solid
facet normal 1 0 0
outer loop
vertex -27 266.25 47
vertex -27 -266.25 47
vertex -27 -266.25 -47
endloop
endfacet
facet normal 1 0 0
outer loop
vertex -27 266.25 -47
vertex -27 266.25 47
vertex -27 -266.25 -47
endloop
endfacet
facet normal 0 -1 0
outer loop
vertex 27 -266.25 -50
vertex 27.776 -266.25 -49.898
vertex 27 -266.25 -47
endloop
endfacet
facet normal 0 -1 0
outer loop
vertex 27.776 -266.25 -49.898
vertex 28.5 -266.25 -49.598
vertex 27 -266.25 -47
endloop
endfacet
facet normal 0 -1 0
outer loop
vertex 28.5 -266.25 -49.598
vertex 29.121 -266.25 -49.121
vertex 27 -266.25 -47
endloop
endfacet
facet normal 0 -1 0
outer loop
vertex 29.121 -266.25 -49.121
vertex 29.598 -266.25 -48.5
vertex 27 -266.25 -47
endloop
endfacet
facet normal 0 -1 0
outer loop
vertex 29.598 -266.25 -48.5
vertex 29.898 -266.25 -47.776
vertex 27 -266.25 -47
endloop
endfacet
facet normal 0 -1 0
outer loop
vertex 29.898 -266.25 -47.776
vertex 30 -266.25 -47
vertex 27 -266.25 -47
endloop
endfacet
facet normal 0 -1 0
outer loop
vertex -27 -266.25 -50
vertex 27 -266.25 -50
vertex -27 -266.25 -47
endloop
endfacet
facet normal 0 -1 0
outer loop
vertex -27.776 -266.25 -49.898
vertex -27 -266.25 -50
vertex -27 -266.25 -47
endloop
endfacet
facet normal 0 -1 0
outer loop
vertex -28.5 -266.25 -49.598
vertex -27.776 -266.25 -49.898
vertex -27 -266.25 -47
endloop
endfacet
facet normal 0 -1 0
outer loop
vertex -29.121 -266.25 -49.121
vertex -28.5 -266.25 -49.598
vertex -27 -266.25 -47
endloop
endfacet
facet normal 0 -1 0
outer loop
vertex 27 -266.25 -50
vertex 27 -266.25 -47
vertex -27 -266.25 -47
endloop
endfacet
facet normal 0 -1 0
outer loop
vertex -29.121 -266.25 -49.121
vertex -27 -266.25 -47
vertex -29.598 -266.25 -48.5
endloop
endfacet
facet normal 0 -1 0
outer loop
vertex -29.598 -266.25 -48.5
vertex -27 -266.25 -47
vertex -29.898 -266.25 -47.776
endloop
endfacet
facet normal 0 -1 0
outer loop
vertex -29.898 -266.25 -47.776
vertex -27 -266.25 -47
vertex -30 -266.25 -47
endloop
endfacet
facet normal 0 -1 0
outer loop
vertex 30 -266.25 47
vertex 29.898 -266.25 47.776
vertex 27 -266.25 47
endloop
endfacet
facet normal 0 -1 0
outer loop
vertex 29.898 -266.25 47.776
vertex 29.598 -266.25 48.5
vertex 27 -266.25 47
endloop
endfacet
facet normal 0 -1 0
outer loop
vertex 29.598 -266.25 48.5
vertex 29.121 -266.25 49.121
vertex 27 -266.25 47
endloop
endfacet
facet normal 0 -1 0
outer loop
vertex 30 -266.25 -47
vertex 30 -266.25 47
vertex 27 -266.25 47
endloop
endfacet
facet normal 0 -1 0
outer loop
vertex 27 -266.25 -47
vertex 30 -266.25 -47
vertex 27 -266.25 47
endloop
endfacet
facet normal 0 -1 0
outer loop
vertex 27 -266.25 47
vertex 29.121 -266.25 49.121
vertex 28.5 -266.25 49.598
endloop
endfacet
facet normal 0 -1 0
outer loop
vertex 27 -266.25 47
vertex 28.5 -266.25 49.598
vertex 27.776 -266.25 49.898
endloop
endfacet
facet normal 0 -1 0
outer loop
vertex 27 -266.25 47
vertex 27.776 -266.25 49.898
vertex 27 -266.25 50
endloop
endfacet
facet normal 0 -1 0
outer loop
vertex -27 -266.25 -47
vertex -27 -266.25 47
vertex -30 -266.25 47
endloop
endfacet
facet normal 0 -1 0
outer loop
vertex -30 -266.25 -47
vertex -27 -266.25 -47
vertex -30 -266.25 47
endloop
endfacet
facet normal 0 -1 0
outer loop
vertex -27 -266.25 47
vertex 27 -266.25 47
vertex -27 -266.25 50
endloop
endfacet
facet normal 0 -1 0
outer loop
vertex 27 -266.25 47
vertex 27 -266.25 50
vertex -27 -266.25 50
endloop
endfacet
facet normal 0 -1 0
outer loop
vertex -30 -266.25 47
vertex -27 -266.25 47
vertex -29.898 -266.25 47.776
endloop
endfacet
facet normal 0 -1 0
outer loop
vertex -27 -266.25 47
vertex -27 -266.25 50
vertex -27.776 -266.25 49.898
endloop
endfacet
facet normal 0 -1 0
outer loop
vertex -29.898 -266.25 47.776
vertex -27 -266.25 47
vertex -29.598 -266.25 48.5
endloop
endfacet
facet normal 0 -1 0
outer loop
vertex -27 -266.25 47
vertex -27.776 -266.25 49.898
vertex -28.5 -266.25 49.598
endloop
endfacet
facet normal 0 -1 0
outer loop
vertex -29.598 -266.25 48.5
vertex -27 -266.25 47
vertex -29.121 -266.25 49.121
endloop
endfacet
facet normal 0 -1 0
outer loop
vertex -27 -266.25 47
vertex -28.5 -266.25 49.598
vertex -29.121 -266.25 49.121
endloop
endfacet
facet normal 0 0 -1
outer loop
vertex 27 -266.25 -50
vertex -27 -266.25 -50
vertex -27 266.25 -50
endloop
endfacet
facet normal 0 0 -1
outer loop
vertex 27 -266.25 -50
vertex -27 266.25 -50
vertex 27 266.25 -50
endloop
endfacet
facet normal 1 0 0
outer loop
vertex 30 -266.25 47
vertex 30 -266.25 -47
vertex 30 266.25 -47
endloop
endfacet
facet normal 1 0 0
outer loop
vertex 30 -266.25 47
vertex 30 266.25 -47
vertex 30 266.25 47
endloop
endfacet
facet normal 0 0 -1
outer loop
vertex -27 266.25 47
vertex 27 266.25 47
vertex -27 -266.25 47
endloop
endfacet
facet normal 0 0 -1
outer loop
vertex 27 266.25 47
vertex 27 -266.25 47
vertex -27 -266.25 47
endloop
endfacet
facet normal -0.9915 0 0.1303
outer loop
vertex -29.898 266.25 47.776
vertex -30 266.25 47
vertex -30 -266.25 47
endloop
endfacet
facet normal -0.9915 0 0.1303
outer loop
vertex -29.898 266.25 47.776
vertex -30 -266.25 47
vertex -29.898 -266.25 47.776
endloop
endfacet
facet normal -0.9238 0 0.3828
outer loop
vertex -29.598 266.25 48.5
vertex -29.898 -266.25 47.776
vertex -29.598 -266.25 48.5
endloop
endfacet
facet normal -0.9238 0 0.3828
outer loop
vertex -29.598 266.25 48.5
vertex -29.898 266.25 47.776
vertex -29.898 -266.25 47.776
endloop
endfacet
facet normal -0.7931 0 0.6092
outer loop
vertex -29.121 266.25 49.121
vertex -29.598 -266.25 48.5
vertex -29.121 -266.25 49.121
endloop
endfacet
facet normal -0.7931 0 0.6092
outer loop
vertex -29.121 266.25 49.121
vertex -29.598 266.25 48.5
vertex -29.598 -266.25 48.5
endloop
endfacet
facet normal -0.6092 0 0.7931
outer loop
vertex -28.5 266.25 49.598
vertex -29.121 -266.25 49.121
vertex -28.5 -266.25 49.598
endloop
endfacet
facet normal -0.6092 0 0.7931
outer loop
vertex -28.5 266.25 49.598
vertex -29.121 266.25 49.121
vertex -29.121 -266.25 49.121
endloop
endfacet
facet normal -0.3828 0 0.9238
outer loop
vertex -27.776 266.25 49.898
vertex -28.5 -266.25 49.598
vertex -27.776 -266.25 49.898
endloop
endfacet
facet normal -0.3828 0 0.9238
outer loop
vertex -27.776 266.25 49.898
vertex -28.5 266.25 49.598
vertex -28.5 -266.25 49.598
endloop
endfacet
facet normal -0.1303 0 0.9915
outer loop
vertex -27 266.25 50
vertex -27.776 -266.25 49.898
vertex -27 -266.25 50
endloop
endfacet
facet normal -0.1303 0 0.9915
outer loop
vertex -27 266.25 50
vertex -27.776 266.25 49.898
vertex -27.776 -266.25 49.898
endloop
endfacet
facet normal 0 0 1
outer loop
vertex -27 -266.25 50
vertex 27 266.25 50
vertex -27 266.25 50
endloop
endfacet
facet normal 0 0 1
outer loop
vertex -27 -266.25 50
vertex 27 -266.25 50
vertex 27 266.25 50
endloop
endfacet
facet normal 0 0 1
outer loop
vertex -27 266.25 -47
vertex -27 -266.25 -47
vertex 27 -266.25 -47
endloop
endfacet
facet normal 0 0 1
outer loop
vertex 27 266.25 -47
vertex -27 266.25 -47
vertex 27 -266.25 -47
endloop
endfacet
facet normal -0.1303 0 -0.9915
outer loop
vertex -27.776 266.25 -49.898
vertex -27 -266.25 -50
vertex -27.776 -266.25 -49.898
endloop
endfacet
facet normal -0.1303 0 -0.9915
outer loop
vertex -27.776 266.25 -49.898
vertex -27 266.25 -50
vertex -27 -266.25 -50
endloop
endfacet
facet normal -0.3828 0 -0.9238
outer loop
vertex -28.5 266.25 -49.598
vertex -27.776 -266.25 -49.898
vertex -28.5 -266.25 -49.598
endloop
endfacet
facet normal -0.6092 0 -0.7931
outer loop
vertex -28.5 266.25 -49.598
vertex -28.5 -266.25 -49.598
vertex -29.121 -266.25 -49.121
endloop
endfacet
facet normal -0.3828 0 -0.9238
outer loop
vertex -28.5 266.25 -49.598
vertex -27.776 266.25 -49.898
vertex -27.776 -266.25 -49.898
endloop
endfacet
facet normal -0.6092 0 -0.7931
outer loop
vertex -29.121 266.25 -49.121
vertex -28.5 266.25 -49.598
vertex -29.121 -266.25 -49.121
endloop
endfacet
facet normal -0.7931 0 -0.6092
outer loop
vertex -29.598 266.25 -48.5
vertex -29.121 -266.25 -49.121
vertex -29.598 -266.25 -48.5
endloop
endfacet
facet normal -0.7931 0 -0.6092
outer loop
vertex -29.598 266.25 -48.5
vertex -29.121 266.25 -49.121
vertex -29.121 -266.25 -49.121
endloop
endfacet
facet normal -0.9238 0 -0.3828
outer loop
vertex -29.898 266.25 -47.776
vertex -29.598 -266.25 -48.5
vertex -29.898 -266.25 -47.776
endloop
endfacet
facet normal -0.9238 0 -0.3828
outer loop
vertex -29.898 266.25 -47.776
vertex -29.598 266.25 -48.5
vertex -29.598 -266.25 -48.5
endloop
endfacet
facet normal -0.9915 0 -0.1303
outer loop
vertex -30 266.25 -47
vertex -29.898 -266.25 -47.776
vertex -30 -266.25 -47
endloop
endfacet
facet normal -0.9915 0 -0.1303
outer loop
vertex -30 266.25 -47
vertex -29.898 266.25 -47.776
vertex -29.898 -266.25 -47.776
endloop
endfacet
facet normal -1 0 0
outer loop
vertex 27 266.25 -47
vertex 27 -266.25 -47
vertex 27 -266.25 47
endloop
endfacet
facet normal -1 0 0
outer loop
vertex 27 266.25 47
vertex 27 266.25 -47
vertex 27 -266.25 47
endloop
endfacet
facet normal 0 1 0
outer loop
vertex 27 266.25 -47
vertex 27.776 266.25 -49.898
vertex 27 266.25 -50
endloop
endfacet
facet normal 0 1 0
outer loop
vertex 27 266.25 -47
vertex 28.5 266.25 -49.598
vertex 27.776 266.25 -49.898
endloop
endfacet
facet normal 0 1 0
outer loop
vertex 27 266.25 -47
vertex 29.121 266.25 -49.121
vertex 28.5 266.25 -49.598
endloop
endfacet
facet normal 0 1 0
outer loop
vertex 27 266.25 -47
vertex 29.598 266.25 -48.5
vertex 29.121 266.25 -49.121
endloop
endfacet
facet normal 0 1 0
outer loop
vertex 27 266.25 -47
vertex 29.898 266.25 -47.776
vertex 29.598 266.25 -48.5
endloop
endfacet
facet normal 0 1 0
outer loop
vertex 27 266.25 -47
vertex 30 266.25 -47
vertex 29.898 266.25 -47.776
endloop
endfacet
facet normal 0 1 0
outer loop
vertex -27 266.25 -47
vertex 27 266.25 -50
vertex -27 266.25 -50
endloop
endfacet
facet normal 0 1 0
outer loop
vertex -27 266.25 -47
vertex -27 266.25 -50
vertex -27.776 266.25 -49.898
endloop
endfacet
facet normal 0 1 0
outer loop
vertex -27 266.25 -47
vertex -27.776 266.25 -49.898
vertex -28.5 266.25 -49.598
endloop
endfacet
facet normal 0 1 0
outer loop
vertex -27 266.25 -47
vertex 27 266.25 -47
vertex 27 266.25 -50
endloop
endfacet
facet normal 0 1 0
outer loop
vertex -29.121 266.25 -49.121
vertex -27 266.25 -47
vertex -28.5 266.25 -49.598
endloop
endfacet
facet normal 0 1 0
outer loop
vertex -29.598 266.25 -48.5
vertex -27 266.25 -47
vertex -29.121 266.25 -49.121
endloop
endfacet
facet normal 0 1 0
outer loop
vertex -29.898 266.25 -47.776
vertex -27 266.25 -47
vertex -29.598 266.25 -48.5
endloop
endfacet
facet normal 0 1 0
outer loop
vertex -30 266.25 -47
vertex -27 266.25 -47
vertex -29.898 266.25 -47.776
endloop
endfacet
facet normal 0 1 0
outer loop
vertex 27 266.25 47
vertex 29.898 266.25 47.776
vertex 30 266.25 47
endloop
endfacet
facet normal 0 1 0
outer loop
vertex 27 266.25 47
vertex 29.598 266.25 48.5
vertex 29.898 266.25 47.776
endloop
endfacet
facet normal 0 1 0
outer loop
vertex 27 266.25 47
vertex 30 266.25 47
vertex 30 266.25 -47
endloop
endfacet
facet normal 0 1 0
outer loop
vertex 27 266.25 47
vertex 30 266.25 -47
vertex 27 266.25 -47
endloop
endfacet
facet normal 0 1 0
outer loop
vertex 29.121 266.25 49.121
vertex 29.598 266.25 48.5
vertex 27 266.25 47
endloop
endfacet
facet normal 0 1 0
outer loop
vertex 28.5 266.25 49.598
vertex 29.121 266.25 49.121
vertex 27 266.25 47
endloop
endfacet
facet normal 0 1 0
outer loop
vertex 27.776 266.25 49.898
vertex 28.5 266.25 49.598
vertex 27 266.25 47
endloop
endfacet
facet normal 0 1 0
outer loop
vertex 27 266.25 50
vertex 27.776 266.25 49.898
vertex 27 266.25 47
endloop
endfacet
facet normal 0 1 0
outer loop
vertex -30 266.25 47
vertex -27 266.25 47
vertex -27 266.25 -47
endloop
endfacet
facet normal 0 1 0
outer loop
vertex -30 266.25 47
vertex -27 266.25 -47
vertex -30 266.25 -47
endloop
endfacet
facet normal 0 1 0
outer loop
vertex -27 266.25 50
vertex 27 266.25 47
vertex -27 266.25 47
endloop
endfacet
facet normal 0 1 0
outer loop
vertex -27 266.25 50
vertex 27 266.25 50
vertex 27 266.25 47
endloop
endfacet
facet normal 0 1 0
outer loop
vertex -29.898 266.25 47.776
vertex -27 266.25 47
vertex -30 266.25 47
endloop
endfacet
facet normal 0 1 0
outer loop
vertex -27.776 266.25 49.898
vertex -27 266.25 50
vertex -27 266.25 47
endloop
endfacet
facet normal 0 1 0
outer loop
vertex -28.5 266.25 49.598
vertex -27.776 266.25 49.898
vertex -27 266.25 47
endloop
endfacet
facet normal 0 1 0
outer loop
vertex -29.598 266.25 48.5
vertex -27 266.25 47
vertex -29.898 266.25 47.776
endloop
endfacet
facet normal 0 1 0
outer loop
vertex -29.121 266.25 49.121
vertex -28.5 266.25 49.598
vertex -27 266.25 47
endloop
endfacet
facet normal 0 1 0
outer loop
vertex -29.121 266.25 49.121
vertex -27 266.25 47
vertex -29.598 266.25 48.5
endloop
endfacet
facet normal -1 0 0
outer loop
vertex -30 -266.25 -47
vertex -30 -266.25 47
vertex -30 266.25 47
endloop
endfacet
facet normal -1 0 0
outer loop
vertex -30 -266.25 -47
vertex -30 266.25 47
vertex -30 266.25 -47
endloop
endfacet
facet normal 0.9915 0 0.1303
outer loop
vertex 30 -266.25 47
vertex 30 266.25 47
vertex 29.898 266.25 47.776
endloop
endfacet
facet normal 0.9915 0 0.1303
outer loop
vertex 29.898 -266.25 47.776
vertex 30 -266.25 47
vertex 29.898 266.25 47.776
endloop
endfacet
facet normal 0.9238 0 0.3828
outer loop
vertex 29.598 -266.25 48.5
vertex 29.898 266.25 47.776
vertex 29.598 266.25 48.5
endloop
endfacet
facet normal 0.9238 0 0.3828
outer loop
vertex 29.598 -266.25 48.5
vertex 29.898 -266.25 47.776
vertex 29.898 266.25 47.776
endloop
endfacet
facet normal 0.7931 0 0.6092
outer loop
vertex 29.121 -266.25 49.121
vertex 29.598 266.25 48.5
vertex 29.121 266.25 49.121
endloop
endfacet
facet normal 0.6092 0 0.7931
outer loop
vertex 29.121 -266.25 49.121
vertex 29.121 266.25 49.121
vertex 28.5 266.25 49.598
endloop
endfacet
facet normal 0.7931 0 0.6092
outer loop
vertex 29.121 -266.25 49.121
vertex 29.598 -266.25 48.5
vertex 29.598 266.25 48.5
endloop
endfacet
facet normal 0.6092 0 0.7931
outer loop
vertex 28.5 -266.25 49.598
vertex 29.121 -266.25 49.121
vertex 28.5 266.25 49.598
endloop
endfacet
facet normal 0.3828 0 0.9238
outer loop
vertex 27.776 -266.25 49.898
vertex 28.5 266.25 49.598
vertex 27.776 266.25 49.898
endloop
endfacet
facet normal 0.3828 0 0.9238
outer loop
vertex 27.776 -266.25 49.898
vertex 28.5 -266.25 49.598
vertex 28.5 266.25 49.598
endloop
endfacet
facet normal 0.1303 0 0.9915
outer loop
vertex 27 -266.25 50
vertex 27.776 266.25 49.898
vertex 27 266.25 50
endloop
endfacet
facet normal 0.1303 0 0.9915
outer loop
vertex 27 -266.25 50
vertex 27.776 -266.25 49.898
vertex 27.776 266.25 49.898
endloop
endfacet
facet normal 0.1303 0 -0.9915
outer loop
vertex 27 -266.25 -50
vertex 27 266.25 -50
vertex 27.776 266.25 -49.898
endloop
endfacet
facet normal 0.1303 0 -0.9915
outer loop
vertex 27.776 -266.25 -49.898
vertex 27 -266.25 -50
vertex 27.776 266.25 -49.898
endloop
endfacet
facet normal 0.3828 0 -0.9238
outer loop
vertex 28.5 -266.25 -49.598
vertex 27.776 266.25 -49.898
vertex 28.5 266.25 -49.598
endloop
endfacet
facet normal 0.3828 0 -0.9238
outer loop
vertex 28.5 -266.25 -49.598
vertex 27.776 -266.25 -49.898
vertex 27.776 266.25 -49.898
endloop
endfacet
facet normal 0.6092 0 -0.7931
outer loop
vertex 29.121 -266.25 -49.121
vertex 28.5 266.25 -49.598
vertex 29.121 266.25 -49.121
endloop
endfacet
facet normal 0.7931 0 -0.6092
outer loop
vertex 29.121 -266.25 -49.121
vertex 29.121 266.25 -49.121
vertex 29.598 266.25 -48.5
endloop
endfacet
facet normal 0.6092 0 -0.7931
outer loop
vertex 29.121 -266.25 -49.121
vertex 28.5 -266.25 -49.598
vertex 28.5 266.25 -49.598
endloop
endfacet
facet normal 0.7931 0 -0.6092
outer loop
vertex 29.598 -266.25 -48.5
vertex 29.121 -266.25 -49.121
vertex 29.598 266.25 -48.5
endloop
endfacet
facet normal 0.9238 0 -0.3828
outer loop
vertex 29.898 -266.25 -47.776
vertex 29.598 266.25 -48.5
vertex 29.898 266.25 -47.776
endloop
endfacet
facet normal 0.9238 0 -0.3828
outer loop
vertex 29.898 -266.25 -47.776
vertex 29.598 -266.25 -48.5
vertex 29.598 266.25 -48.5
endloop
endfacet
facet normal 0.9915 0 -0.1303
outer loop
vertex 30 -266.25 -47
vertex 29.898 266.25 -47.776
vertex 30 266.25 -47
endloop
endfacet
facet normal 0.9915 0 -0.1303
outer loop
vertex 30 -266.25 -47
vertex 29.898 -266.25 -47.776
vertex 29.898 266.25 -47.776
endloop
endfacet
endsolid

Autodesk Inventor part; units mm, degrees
ref_plane "YZ Plane" through (0, 0, 0) normal (1, 0, 0) x (0, 1, 0)
ref_plane "XZ Plane" through (0, 0, 0) normal (0, 1, 0) x (-1, 0, 0)
ref_plane "XY Plane" through (0, 0, 0) normal (0, 0, 1) x (1, 0, 0)
sketch "Sketch1" plane through (0, 0, 0) normal (0, 1, 0) x (-1, 0, 0)
  line L0 (30, -50) -> (-30, -50)
  line L1 (-30, -50) -> (-30, 50)
  line L2 (-30, 50) -> (30, 50)
  line L3 (30, 50) -> (30, -50)
  line L4 (30, -50) -> (-30, 50) construction
  line L5 (-30, -50) -> (30, 50) construction
  point P0 (0, 0)
  dimension "d0" = 60
  dimension "d1" = 100
extrude "Extrusion1" add sketch "Sketch1" along normal mid plane 532.5
fillet "Fillet1" radius 3 4 edges at (-30, 0, 50) (30, 0, 50) (30, 0, -50) (-30, 0, -50)
shell "Shell1" thickness 3 removed faces 2 at (10, -266.25, 15.6667) at (10, 266.25, 15.6667)
properties part number "Perfil refuerzo"
